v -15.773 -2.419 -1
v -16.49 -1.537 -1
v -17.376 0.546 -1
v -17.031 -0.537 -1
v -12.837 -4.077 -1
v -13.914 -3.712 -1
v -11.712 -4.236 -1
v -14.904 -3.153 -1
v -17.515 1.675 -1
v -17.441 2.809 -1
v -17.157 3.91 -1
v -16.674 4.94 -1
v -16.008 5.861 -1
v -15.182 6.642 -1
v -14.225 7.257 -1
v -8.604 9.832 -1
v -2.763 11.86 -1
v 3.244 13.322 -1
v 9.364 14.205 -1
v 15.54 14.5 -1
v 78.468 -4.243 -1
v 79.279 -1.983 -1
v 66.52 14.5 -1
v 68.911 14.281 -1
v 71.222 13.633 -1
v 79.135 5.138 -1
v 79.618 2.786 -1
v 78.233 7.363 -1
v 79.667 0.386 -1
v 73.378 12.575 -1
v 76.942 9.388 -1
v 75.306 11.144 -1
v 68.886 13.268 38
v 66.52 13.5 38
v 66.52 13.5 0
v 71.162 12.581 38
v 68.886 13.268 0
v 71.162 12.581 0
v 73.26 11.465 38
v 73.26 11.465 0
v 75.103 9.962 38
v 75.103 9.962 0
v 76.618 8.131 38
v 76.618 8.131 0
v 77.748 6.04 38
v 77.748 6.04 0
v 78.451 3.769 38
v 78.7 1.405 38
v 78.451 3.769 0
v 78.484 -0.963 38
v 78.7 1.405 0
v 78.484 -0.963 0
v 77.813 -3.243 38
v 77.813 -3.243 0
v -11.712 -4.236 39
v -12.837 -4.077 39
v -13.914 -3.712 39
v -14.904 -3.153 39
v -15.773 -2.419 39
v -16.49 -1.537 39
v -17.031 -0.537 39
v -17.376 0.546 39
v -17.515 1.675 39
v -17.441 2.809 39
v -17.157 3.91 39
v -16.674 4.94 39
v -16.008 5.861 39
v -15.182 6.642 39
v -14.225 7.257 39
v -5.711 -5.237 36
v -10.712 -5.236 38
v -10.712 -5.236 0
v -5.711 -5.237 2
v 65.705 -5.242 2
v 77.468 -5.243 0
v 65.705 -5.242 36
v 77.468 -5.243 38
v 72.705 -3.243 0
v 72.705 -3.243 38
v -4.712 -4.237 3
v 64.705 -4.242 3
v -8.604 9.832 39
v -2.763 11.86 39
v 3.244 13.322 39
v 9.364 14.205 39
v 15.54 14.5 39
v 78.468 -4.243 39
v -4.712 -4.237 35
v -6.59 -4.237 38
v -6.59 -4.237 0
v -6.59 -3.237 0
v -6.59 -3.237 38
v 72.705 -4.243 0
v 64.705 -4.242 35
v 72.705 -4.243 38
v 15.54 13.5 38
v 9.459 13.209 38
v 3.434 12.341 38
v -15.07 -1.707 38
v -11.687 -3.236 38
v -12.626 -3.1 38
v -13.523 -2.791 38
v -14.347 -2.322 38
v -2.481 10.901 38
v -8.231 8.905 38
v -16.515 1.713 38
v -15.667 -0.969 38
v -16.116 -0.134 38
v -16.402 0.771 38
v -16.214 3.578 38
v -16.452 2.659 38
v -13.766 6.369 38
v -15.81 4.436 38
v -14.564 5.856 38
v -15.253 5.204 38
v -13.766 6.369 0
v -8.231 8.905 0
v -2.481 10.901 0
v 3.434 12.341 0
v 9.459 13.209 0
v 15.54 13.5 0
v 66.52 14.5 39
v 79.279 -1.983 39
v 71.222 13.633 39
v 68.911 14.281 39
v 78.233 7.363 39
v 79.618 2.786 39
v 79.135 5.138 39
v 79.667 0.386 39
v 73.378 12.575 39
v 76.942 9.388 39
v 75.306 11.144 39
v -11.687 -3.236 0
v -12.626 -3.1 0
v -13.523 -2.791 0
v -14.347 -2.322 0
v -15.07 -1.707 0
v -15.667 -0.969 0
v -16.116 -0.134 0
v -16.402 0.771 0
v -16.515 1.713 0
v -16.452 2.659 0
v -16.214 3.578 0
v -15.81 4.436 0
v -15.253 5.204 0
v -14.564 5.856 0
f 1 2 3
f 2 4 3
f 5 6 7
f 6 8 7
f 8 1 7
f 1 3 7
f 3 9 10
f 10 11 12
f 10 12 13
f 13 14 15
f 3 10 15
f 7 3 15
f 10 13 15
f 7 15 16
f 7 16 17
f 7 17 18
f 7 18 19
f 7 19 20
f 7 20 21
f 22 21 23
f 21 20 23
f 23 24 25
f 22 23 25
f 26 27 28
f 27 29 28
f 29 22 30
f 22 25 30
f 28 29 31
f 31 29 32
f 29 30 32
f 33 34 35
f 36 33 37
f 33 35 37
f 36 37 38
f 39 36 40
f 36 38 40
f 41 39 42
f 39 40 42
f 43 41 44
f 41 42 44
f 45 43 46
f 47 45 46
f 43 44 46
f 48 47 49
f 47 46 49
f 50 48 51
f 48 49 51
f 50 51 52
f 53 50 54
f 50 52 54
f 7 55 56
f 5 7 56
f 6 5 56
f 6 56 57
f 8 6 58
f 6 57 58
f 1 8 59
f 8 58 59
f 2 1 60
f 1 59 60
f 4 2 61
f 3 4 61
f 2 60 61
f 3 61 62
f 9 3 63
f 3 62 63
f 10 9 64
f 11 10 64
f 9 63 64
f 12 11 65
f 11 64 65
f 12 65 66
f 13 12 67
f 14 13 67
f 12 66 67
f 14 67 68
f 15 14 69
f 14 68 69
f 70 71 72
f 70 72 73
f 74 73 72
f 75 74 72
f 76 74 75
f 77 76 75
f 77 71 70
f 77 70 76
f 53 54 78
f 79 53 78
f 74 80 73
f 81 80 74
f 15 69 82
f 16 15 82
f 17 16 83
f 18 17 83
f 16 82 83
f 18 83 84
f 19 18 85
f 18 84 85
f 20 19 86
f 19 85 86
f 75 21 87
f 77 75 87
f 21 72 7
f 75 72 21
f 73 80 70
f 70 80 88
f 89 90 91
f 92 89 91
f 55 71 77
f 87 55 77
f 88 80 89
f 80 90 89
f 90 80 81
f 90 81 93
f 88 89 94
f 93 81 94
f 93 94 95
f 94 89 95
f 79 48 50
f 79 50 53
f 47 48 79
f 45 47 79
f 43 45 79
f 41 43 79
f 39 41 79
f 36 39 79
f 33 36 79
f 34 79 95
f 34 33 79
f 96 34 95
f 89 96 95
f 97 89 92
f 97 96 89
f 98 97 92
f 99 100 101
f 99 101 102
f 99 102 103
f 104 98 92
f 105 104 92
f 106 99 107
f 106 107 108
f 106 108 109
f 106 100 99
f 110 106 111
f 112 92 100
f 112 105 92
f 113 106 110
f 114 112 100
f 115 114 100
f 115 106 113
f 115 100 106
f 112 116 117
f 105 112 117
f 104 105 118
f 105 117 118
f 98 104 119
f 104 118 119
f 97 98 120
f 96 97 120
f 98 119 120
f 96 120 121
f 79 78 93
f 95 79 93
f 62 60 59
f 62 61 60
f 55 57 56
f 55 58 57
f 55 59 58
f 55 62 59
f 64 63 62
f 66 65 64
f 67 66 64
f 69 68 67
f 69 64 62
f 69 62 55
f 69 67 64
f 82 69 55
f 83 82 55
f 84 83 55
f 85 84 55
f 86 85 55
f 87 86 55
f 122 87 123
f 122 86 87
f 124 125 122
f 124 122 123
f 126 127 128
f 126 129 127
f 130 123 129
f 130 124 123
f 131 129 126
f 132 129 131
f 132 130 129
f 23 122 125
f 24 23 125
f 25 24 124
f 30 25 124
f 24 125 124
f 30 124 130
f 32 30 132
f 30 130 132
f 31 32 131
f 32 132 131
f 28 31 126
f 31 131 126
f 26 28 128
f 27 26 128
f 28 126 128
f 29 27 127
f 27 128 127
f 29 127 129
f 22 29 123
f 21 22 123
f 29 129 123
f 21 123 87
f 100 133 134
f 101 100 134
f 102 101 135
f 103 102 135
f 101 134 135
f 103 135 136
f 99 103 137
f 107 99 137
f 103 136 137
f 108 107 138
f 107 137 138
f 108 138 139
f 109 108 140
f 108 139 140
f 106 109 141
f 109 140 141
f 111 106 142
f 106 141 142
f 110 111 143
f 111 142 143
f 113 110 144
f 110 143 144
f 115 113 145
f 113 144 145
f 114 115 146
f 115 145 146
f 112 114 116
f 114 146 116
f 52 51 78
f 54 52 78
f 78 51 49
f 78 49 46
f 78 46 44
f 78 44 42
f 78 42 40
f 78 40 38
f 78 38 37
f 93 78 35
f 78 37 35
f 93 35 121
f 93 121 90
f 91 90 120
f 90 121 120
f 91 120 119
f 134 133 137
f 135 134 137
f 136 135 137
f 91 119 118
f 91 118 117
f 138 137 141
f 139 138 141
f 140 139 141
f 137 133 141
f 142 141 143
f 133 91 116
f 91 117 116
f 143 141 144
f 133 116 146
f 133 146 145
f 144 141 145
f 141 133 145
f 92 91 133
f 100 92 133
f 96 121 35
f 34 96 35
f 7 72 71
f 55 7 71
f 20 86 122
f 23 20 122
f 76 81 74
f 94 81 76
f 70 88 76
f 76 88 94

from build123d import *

# Parameters (mm, degrees)
BOSS_EXTRUDE1_DEPTH = 38
BOSS_EXTRUDE2_START = 1
BOSS_EXTRUDE2_DEPTH = 1
SKETCH3_W           = 90.179925192
SKETCH3_H           = 40
SKETCH3_W_2         = 69.416494059
SKETCH3_H_2         = 32
BOSS_EXTRUDE3_DEPTH = 1
CHAMFER1_SIZE       = 1


with BuildPart() as part:
    # Sketch1 → Boss-Extrude1 (new body)
    with BuildSketch(Plane.XY):
        with BuildLine():
            Line((66.52, 14.5), (15.54, 14.5))
            ThreePointArc((15.54, 14.5), (0.223169493, 12.66316181), (-14.225037528, 7.256815055))
            ThreePointArc((-14.225037528, 7.256815055), (-17.376400179, 0.546177113), (-11.711514098, -4.236375954))
            Line((-11.711514098, -4.236375954), (-6.590403043, -4.236765961))
            Line((-6.590403043, -4.236765961), (-6.590326886, -3.236765964))
            Line((-6.590326886, -3.236765964), (-11.687025279, -3.236377816))
            ThreePointArc((-11.687025279, -3.236377816), (-16.401861513, 0.77072863), (-13.765555848, 6.368627808))
            ThreePointArc((-13.765555848, 6.368627808), (0.459614785, 11.691517006), (15.54, 13.5))
            Line((15.54, 13.5), (66.52, 13.5))
            ThreePointArc((66.52, 13.5), (76.617843982, 8.130760845), (77.812974461, -3.243193847))
            Line((77.812974461, -3.243193847), (72.705055873, -3.242804844))
            Line((72.705055873, -3.242804844), (72.704979716, -4.242804841))
            Line((72.704979716, -4.242804841), (78.468410832, -4.243243765))
            ThreePointArc((78.468410832, -4.243243765), (77.633884428, 8.404811863), (66.52, 14.5))
        make_face()
    extrude(amount=BOSS_EXTRUDE1_DEPTH)

    # Sketch2 → Boss-Extrude2 (add)
    with BuildSketch(Plane(origin=(0, 0, 0), x_dir=(-1, 0, 0), z_dir=(0, 0, -1)).offset(BOSS_EXTRUDE2_START)):
        with BuildLine():
            Line((-72.704979716, -4.242804841), (6.590403043, -4.236765961))
            Line((6.590403043, -4.236765961), (11.711514098, -4.236375954))
            ThreePointArc((11.711514098, -4.236375954), (17.376400179, 0.546177113), (14.225037528, 7.256815055))
            ThreePointArc((14.225037528, 7.256815055), (-0.223169493, 12.66316181), (-15.54, 14.5))
            Line((-15.54, 14.5), (-66.52, 14.5))
            ThreePointArc((-66.52, 14.5), (-77.633884428, 8.404811863), (-78.468410832, -4.243243765))
            Line((-78.468410832, -4.243243765), (-72.704979716, -4.242804841))
        make_face()
    boss_extrude2 = extrude(amount=-BOSS_EXTRUDE2_DEPTH)

    # Mirror1: Boss-Extrude2 across plane
    add(boss_extrude2.mirror(Plane.XY.offset(19)))

    # Sketch3 → Boss-Extrude3 (add)
    with BuildSketch(Plane(origin=(-0.000322697, -4.23726784, 0), x_dir=(0.9999999971000731, -7.615677136513779e-05, 0), z_dir=(-7.615677136513779e-05, -0.9999999971000731, 0))):
        with Locations((33.378771161, 19)):
            Rectangle(SKETCH3_W, SKETCH3_H)
        with Locations((29.997055594, 19)):
            Rectangle(SKETCH3_W_2, SKETCH3_H_2, mode=Mode.SUBTRACT)
    extrude(amount=BOSS_EXTRUDE3_DEPTH)

    # Chamfer1
    chamfer1_edges = [part.edges().sort_by_distance(p)[0] for p in [
        (-11.711590255, -5.236375951, 19),
        (-4.711590275, -5.236909048, 19),
        (29.996656654, -5.239552316, 3),
        (29.996656654, -5.239552316, 35),
        (64.704903583, -5.242195584, 19),
        (78.468334676, -5.243243763, 19),
        (33.37837221, -5.239809857, 39),
        (33.37837221, -5.239809857, -1),
    ]]
    chamfer(chamfer1_edges, length=CHAMFER1_SIZE - 0.0001)  # a hair under: the kernel refuses the full size


solid = part.part
